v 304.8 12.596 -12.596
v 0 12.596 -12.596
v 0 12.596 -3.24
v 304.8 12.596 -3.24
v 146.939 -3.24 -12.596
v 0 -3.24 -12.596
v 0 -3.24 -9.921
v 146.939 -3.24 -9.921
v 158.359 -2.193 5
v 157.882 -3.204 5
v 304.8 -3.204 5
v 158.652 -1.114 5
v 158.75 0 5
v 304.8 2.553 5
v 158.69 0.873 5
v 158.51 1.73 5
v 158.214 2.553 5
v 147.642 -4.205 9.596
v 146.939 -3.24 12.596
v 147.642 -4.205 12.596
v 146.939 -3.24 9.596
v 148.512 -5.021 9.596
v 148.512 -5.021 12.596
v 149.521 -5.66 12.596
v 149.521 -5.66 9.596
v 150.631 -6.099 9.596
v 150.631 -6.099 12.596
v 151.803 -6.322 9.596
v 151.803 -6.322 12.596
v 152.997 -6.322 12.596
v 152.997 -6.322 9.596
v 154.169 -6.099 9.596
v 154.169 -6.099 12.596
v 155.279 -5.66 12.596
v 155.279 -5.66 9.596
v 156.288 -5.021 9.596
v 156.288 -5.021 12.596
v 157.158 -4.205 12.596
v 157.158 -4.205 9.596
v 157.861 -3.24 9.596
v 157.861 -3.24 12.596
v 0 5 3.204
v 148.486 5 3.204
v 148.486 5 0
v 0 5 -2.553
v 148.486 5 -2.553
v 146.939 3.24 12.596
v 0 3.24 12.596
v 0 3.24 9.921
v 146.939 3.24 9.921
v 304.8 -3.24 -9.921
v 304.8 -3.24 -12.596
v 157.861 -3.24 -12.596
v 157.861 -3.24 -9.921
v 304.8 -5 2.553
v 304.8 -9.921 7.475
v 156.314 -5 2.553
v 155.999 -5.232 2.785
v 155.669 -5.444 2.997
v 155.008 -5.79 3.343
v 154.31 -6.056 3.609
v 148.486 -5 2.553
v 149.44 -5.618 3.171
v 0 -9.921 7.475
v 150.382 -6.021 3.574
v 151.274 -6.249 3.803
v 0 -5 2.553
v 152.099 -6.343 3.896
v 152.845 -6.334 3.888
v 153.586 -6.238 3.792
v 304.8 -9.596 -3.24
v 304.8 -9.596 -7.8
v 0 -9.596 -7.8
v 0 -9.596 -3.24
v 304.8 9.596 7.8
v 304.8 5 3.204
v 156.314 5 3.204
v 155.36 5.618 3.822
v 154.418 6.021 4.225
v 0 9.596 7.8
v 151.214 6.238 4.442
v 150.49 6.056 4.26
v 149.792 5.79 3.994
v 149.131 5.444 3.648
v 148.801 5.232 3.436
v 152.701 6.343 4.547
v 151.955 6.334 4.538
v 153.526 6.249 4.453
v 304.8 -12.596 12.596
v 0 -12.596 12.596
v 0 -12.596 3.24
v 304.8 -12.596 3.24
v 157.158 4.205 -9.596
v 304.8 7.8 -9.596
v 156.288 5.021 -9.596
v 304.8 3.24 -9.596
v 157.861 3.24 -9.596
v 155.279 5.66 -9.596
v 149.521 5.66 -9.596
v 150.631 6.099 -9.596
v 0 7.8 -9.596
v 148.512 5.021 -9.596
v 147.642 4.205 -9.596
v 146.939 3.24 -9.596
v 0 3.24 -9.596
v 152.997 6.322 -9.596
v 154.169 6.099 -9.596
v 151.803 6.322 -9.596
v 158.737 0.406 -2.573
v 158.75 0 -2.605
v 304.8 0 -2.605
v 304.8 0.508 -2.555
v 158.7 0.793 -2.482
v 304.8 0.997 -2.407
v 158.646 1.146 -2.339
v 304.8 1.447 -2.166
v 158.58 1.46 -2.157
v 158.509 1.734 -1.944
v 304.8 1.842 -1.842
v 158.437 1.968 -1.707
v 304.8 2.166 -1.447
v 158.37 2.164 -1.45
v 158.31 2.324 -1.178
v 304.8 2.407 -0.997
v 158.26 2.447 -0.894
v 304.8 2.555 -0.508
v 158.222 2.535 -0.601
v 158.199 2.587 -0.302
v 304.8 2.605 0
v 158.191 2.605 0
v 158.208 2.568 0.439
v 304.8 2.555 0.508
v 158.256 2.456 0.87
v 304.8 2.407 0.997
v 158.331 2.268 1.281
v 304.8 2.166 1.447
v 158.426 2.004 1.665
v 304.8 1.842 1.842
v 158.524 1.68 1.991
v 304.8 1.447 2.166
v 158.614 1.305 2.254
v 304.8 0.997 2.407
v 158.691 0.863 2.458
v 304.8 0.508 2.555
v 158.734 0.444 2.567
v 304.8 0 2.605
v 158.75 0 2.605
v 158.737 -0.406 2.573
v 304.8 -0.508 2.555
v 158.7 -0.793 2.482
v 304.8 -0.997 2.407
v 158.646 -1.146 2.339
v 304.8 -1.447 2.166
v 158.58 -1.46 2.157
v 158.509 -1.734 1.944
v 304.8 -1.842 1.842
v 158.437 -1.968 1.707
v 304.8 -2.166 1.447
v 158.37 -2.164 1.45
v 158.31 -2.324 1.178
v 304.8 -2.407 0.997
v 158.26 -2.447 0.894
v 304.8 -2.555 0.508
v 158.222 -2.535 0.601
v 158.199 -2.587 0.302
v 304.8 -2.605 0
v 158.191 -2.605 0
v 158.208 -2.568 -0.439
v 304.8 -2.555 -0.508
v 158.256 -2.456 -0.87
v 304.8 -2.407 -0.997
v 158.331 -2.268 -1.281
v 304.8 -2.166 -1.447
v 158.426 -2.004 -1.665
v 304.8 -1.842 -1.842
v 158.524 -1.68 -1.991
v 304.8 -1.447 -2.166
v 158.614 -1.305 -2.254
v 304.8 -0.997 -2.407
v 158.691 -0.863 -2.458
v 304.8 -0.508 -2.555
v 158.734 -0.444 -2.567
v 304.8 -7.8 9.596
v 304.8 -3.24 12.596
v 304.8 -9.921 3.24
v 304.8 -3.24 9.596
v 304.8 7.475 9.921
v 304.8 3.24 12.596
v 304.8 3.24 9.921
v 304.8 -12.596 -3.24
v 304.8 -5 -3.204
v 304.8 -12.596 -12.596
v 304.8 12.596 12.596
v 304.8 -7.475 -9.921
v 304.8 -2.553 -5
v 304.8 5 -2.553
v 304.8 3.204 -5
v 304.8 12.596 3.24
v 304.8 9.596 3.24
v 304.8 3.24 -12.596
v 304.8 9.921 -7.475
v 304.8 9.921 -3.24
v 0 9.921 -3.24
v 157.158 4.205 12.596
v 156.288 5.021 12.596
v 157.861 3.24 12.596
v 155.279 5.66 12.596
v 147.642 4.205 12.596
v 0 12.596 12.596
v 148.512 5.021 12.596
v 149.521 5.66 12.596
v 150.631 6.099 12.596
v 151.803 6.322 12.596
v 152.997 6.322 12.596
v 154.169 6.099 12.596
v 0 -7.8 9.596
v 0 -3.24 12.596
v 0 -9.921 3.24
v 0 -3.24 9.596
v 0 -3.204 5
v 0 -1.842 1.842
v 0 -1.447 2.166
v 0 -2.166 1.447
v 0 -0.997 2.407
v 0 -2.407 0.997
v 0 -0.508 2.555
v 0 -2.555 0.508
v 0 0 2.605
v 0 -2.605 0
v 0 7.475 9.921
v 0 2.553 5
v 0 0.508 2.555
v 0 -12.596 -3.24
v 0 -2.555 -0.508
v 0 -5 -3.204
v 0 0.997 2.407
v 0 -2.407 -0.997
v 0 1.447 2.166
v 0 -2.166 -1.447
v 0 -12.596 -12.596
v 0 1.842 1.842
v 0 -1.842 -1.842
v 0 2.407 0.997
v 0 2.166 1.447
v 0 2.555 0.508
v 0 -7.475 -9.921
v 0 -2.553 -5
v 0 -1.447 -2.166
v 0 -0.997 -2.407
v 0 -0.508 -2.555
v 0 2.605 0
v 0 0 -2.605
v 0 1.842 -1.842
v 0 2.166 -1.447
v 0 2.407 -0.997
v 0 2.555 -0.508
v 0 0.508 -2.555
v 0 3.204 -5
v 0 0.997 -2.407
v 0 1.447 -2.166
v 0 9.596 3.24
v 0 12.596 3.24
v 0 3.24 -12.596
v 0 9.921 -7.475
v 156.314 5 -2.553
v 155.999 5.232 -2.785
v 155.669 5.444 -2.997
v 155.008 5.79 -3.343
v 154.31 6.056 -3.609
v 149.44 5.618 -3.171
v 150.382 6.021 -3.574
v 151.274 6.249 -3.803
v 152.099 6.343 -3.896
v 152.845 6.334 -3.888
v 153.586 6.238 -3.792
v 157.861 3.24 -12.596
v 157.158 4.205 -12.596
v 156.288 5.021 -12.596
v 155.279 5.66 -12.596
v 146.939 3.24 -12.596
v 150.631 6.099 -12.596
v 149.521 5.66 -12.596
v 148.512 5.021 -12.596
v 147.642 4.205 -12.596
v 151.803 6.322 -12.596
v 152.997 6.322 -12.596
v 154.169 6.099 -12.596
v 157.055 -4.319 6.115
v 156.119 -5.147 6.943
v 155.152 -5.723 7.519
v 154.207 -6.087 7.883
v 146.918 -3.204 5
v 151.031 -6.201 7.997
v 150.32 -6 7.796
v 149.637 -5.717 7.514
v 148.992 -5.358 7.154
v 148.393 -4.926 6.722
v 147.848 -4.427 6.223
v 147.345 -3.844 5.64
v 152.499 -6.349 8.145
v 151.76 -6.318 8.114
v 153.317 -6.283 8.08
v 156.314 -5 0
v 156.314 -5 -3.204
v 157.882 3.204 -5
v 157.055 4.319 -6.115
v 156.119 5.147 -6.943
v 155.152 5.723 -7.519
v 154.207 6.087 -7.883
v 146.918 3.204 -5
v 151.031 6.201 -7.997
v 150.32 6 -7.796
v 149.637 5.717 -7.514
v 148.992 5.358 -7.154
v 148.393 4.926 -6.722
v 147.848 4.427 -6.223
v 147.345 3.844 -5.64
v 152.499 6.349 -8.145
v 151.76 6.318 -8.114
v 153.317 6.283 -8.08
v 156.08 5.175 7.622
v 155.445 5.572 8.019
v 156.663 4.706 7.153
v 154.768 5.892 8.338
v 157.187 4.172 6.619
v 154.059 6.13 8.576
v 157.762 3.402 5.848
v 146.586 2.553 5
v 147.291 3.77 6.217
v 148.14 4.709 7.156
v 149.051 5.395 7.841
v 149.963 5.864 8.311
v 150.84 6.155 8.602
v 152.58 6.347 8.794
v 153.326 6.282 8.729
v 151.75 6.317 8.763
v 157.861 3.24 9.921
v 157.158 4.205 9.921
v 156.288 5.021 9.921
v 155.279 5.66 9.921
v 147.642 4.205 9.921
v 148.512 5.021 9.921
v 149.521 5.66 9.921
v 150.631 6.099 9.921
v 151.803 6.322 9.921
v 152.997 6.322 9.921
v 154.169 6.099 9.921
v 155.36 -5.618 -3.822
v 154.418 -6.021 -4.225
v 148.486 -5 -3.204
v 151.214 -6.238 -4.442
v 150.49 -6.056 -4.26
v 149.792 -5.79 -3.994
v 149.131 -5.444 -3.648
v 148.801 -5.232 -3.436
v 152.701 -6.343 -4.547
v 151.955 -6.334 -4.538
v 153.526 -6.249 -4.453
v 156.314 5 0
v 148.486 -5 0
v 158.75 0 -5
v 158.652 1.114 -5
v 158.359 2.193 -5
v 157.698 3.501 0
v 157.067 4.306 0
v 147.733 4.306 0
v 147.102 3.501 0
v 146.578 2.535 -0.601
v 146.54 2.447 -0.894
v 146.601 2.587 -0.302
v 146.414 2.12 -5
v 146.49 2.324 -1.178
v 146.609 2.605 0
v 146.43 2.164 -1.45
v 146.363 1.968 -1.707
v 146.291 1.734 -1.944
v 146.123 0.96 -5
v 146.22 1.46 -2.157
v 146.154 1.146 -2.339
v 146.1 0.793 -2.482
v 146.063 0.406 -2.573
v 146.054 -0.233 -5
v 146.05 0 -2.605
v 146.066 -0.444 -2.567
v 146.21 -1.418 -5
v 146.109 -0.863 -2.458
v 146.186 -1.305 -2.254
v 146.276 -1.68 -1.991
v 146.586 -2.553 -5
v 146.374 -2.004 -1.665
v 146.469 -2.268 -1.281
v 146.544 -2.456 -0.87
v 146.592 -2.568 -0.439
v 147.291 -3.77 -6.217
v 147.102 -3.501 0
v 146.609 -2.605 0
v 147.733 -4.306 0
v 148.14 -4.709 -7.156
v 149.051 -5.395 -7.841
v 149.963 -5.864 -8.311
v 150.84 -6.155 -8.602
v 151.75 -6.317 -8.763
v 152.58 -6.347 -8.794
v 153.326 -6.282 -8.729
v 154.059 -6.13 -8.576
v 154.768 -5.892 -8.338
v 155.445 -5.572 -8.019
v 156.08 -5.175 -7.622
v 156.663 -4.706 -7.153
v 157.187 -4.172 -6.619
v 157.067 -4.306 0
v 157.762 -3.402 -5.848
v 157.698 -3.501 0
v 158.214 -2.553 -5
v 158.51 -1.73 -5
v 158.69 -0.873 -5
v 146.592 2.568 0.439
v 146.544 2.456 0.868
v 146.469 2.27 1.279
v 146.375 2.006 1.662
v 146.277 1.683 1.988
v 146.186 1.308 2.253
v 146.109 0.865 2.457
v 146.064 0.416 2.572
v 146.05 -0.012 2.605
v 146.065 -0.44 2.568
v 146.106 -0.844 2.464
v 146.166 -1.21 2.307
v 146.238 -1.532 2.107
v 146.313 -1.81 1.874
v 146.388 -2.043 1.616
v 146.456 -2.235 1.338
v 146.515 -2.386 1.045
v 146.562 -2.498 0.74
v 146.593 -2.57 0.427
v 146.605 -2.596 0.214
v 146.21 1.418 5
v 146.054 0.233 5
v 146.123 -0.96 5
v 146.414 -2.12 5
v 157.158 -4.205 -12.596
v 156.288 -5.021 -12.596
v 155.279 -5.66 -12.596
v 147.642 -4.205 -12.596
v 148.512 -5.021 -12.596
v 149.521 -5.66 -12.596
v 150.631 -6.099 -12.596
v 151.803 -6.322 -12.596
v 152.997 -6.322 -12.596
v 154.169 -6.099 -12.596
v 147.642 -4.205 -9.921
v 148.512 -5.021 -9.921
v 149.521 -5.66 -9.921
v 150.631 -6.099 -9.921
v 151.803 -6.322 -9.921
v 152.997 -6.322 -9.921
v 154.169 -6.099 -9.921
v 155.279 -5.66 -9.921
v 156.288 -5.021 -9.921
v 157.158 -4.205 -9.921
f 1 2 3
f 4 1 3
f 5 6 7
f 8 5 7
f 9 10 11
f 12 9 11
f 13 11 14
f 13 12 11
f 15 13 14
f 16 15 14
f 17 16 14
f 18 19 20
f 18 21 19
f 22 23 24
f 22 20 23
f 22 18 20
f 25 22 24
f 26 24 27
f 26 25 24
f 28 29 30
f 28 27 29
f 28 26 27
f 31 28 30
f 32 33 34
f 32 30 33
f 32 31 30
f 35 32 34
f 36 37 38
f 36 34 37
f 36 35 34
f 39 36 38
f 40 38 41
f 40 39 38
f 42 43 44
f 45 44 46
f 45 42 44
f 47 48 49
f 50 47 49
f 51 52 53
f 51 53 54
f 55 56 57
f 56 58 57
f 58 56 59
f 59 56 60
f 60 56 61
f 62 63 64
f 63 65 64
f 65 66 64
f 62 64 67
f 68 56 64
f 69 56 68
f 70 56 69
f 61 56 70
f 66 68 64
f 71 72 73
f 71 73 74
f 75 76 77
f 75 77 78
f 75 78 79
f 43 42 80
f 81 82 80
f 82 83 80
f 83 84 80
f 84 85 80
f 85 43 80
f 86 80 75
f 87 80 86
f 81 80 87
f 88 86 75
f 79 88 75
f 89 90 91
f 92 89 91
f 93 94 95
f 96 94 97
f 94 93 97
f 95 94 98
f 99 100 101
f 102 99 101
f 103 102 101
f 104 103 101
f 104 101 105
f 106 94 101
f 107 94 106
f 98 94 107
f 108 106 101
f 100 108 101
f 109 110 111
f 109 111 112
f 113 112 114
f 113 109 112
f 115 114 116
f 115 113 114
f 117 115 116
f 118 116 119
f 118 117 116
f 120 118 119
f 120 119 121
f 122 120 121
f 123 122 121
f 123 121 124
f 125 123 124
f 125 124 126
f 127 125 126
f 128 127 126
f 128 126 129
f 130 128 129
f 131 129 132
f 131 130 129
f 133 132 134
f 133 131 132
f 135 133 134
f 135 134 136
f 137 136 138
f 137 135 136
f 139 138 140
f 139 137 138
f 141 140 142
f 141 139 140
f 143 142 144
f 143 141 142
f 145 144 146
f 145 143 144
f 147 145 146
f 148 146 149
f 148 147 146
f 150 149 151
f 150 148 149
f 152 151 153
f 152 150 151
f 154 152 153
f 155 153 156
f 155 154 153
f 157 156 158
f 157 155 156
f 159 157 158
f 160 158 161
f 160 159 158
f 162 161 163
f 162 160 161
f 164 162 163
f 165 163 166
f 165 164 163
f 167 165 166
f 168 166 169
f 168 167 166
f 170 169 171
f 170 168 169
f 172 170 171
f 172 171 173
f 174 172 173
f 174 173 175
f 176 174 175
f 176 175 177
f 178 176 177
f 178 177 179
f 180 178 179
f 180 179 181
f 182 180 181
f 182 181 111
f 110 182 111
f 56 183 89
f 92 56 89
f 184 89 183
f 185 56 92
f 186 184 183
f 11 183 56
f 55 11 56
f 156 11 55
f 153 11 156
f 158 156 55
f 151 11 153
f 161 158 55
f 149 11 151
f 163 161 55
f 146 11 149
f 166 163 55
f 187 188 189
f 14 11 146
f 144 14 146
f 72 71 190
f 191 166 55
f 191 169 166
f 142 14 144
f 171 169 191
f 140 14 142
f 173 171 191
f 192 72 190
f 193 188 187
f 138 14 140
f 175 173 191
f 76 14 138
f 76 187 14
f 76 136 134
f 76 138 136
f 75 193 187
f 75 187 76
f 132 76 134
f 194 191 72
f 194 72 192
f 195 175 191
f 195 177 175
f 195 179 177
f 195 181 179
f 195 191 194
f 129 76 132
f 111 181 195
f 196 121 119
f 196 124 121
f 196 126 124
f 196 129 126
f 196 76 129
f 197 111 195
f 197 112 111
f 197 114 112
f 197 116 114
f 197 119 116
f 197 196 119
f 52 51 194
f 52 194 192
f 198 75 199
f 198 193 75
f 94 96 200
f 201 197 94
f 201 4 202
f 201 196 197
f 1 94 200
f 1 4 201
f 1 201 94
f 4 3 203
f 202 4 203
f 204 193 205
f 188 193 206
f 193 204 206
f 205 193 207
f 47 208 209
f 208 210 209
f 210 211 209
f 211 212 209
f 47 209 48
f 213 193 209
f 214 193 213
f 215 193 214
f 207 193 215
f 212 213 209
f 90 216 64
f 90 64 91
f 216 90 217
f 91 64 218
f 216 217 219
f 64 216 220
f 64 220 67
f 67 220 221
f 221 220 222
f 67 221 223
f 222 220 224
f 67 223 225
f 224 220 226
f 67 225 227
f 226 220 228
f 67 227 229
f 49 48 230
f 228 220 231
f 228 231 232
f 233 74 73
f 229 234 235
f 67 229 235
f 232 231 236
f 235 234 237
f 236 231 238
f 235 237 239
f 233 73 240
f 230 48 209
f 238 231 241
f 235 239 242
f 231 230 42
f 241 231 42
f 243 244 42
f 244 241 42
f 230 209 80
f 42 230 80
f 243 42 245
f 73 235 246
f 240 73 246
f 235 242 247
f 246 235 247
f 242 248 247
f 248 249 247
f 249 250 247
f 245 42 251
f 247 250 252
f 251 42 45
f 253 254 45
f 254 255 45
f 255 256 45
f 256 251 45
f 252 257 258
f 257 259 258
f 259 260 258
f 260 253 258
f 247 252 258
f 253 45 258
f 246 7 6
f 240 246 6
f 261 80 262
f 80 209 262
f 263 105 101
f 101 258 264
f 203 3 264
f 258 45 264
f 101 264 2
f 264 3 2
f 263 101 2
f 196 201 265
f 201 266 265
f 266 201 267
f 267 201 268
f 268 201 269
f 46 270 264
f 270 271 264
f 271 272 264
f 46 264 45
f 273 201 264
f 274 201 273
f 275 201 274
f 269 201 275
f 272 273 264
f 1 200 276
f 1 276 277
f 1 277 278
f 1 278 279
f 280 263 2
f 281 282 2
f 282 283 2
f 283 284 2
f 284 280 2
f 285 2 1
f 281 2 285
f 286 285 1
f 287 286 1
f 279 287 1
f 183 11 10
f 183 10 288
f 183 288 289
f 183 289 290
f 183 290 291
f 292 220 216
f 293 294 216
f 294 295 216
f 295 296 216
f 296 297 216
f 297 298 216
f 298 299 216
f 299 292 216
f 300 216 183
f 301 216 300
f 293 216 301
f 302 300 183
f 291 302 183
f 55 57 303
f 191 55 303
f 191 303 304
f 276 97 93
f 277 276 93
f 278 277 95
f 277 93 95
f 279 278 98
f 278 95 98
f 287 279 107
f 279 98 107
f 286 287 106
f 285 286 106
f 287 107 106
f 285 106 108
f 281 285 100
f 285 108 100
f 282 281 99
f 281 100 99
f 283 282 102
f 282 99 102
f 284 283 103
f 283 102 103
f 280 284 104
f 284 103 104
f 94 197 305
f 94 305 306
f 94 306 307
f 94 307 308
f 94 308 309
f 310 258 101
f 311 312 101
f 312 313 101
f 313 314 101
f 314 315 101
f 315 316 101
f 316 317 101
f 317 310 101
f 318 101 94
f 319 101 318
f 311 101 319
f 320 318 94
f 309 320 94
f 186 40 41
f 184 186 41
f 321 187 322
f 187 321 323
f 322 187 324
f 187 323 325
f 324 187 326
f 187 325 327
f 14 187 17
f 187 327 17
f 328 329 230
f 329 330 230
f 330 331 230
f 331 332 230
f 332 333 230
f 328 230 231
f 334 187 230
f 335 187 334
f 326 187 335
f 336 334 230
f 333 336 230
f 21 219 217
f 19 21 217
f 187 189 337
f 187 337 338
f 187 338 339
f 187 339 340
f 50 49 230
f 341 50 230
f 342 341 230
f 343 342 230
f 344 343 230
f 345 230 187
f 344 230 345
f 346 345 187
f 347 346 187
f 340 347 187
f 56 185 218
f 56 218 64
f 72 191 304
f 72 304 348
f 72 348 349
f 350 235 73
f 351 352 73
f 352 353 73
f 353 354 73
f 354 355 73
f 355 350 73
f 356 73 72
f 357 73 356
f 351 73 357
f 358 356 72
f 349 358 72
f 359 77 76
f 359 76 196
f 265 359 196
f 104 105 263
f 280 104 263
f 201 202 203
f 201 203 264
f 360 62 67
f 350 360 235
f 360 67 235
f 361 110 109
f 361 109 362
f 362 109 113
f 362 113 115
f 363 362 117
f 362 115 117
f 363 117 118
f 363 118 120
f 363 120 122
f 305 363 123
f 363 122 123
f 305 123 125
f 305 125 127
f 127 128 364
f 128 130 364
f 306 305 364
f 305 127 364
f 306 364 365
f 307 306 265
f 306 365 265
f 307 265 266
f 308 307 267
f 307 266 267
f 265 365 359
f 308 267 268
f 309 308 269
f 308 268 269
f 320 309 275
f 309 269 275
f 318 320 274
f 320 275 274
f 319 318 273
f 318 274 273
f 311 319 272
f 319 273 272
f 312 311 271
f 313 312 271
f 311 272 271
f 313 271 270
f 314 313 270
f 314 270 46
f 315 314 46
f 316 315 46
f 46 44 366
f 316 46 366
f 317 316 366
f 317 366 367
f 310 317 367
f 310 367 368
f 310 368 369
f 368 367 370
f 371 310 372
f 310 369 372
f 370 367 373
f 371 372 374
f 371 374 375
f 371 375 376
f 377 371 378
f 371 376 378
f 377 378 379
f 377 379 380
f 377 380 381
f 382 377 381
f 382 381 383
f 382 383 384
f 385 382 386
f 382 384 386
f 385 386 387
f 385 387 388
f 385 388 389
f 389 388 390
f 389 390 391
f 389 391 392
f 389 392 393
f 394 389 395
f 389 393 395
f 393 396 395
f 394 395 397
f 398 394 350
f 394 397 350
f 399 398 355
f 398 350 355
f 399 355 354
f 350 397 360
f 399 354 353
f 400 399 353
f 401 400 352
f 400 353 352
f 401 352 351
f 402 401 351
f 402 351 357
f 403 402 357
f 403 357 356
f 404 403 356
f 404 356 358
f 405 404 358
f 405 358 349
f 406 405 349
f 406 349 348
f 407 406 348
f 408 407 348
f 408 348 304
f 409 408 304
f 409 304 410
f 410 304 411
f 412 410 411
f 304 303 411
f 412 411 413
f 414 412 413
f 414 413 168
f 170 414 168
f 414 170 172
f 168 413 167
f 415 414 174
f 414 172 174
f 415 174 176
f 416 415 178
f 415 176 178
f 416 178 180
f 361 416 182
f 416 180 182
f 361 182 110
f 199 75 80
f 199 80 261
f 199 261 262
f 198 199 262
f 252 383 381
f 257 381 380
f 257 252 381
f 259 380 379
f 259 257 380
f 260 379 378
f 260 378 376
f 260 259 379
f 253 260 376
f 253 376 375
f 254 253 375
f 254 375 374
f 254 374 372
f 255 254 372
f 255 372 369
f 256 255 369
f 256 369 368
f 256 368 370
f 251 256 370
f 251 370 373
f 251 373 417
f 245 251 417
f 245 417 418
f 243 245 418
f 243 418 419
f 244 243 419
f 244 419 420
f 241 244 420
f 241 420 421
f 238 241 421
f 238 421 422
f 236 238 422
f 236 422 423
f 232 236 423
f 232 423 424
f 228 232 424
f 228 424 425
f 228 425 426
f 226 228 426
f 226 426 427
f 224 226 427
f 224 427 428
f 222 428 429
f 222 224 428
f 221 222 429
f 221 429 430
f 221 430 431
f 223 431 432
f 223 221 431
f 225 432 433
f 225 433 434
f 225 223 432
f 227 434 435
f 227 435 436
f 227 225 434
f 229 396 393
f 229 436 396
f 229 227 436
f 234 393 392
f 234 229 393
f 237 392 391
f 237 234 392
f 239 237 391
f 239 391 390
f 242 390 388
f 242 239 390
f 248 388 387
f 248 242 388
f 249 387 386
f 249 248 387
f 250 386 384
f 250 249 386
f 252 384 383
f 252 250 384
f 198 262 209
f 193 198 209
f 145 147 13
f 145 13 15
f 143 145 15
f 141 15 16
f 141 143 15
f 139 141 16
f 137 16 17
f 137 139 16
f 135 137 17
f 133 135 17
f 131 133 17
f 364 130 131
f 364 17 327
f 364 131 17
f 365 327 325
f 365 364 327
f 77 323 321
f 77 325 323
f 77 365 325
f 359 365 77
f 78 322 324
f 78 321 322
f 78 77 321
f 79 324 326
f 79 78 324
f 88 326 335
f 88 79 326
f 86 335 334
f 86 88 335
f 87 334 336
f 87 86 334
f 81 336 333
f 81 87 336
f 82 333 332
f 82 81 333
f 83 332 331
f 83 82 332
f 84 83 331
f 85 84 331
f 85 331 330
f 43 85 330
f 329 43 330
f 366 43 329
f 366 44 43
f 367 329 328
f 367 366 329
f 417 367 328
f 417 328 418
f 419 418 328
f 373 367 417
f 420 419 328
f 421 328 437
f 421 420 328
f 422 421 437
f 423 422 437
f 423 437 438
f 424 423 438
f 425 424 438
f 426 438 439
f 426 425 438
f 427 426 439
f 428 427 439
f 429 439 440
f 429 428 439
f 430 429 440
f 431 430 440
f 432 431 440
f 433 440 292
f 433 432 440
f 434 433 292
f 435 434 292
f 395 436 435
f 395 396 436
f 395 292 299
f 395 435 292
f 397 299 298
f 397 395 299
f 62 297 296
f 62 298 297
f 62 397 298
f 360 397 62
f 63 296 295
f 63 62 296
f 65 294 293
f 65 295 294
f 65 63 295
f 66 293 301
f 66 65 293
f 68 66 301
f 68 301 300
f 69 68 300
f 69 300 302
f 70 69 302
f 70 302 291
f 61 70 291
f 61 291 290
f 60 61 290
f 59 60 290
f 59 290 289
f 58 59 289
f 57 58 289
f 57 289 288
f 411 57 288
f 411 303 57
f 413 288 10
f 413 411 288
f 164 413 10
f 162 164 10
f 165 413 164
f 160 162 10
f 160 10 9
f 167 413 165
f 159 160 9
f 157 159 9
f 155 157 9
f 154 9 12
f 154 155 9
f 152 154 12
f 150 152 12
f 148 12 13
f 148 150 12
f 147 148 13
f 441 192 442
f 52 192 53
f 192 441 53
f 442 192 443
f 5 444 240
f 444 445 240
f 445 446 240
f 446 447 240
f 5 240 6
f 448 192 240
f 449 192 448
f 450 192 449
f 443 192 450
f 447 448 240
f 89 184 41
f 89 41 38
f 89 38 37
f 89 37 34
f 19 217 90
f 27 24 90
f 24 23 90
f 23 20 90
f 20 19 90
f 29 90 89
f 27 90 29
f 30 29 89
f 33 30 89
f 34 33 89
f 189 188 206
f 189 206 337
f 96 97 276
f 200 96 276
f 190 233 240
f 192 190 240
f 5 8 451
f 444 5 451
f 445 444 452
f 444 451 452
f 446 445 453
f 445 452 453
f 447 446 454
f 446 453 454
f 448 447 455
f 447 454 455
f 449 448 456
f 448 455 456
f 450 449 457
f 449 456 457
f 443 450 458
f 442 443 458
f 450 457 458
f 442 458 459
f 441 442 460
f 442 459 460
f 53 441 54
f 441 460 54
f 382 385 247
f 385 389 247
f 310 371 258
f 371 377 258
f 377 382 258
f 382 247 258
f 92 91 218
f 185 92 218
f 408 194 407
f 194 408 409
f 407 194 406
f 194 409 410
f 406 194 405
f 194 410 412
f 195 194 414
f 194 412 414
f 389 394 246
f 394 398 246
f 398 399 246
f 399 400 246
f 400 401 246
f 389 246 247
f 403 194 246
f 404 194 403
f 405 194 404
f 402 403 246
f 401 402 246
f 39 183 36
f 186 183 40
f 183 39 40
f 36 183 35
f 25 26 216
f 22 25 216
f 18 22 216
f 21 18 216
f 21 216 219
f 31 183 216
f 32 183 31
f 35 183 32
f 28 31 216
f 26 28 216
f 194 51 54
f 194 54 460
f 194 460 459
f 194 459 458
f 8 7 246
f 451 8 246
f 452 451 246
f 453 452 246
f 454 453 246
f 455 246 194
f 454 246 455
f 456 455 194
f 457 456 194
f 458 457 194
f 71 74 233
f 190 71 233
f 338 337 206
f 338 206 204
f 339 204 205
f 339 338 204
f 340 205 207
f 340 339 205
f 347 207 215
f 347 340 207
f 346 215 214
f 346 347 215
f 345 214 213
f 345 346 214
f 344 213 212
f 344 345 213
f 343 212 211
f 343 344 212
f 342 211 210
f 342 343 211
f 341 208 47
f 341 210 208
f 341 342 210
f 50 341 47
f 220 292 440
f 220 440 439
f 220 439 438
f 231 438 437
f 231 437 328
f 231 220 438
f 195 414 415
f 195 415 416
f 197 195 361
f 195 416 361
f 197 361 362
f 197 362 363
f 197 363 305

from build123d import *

# Parameters (mm, degrees)
SKETCH1_R               = 2.605
BOSS_EXTRUDE1_DEPTH     = 304.8
CIRPATTERN1_COUNT       = 4
CUT_EXTRUDE1_DEPTH      = 20
CUT_EXTRUDE1_DEPTH_BACK = 30
SKETCH2_R               = 6.35


with BuildPart() as part:
    # Sketch1 → Boss-Extrude1 (new body)
    with BuildSketch(Plane(origin=(0, 0, 0), x_dir=(0, 0, -1), z_dir=(1, 0, 0))):
        Polygon((5, -5), (5, 3.203948776), (9.596194078, 7.800142853), (9.596194078, 3.24), (12.596194078, 3.24), (12.596194078, 12.596194078), (3.24, 12.596194078), (3.24, 9.921463197), (7.474873734, 9.921463197), (2.553410537, 5), (-5, 5), (-5, -5), align=None)
        Circle(SKETCH1_R, mode=Mode.SUBTRACT)
    boss_extrude1 = extrude(amount=BOSS_EXTRUDE1_DEPTH)

    # CirPattern1: Boss-Extrude1 ×4 about axis
    cirpattern1_axis = Axis((0, 0, 0), (1, 0, 0))
    for i in range(1, CIRPATTERN1_COUNT):
        add(boss_extrude1.rotate(cirpattern1_axis, i * 360 / CIRPATTERN1_COUNT))

    # Sketch2 → Cut-Extrude1 (cut, two sides: drawn at the far end of the back side and taken through both)
    with BuildSketch(Plane.XY.offset(-CUT_EXTRUDE1_DEPTH_BACK)):
        with Locations((152.4, 0)):
            Circle(SKETCH2_R)
    extrude(amount=CUT_EXTRUDE1_DEPTH + CUT_EXTRUDE1_DEPTH_BACK, mode=Mode.SUBTRACT)


solid = part.part
